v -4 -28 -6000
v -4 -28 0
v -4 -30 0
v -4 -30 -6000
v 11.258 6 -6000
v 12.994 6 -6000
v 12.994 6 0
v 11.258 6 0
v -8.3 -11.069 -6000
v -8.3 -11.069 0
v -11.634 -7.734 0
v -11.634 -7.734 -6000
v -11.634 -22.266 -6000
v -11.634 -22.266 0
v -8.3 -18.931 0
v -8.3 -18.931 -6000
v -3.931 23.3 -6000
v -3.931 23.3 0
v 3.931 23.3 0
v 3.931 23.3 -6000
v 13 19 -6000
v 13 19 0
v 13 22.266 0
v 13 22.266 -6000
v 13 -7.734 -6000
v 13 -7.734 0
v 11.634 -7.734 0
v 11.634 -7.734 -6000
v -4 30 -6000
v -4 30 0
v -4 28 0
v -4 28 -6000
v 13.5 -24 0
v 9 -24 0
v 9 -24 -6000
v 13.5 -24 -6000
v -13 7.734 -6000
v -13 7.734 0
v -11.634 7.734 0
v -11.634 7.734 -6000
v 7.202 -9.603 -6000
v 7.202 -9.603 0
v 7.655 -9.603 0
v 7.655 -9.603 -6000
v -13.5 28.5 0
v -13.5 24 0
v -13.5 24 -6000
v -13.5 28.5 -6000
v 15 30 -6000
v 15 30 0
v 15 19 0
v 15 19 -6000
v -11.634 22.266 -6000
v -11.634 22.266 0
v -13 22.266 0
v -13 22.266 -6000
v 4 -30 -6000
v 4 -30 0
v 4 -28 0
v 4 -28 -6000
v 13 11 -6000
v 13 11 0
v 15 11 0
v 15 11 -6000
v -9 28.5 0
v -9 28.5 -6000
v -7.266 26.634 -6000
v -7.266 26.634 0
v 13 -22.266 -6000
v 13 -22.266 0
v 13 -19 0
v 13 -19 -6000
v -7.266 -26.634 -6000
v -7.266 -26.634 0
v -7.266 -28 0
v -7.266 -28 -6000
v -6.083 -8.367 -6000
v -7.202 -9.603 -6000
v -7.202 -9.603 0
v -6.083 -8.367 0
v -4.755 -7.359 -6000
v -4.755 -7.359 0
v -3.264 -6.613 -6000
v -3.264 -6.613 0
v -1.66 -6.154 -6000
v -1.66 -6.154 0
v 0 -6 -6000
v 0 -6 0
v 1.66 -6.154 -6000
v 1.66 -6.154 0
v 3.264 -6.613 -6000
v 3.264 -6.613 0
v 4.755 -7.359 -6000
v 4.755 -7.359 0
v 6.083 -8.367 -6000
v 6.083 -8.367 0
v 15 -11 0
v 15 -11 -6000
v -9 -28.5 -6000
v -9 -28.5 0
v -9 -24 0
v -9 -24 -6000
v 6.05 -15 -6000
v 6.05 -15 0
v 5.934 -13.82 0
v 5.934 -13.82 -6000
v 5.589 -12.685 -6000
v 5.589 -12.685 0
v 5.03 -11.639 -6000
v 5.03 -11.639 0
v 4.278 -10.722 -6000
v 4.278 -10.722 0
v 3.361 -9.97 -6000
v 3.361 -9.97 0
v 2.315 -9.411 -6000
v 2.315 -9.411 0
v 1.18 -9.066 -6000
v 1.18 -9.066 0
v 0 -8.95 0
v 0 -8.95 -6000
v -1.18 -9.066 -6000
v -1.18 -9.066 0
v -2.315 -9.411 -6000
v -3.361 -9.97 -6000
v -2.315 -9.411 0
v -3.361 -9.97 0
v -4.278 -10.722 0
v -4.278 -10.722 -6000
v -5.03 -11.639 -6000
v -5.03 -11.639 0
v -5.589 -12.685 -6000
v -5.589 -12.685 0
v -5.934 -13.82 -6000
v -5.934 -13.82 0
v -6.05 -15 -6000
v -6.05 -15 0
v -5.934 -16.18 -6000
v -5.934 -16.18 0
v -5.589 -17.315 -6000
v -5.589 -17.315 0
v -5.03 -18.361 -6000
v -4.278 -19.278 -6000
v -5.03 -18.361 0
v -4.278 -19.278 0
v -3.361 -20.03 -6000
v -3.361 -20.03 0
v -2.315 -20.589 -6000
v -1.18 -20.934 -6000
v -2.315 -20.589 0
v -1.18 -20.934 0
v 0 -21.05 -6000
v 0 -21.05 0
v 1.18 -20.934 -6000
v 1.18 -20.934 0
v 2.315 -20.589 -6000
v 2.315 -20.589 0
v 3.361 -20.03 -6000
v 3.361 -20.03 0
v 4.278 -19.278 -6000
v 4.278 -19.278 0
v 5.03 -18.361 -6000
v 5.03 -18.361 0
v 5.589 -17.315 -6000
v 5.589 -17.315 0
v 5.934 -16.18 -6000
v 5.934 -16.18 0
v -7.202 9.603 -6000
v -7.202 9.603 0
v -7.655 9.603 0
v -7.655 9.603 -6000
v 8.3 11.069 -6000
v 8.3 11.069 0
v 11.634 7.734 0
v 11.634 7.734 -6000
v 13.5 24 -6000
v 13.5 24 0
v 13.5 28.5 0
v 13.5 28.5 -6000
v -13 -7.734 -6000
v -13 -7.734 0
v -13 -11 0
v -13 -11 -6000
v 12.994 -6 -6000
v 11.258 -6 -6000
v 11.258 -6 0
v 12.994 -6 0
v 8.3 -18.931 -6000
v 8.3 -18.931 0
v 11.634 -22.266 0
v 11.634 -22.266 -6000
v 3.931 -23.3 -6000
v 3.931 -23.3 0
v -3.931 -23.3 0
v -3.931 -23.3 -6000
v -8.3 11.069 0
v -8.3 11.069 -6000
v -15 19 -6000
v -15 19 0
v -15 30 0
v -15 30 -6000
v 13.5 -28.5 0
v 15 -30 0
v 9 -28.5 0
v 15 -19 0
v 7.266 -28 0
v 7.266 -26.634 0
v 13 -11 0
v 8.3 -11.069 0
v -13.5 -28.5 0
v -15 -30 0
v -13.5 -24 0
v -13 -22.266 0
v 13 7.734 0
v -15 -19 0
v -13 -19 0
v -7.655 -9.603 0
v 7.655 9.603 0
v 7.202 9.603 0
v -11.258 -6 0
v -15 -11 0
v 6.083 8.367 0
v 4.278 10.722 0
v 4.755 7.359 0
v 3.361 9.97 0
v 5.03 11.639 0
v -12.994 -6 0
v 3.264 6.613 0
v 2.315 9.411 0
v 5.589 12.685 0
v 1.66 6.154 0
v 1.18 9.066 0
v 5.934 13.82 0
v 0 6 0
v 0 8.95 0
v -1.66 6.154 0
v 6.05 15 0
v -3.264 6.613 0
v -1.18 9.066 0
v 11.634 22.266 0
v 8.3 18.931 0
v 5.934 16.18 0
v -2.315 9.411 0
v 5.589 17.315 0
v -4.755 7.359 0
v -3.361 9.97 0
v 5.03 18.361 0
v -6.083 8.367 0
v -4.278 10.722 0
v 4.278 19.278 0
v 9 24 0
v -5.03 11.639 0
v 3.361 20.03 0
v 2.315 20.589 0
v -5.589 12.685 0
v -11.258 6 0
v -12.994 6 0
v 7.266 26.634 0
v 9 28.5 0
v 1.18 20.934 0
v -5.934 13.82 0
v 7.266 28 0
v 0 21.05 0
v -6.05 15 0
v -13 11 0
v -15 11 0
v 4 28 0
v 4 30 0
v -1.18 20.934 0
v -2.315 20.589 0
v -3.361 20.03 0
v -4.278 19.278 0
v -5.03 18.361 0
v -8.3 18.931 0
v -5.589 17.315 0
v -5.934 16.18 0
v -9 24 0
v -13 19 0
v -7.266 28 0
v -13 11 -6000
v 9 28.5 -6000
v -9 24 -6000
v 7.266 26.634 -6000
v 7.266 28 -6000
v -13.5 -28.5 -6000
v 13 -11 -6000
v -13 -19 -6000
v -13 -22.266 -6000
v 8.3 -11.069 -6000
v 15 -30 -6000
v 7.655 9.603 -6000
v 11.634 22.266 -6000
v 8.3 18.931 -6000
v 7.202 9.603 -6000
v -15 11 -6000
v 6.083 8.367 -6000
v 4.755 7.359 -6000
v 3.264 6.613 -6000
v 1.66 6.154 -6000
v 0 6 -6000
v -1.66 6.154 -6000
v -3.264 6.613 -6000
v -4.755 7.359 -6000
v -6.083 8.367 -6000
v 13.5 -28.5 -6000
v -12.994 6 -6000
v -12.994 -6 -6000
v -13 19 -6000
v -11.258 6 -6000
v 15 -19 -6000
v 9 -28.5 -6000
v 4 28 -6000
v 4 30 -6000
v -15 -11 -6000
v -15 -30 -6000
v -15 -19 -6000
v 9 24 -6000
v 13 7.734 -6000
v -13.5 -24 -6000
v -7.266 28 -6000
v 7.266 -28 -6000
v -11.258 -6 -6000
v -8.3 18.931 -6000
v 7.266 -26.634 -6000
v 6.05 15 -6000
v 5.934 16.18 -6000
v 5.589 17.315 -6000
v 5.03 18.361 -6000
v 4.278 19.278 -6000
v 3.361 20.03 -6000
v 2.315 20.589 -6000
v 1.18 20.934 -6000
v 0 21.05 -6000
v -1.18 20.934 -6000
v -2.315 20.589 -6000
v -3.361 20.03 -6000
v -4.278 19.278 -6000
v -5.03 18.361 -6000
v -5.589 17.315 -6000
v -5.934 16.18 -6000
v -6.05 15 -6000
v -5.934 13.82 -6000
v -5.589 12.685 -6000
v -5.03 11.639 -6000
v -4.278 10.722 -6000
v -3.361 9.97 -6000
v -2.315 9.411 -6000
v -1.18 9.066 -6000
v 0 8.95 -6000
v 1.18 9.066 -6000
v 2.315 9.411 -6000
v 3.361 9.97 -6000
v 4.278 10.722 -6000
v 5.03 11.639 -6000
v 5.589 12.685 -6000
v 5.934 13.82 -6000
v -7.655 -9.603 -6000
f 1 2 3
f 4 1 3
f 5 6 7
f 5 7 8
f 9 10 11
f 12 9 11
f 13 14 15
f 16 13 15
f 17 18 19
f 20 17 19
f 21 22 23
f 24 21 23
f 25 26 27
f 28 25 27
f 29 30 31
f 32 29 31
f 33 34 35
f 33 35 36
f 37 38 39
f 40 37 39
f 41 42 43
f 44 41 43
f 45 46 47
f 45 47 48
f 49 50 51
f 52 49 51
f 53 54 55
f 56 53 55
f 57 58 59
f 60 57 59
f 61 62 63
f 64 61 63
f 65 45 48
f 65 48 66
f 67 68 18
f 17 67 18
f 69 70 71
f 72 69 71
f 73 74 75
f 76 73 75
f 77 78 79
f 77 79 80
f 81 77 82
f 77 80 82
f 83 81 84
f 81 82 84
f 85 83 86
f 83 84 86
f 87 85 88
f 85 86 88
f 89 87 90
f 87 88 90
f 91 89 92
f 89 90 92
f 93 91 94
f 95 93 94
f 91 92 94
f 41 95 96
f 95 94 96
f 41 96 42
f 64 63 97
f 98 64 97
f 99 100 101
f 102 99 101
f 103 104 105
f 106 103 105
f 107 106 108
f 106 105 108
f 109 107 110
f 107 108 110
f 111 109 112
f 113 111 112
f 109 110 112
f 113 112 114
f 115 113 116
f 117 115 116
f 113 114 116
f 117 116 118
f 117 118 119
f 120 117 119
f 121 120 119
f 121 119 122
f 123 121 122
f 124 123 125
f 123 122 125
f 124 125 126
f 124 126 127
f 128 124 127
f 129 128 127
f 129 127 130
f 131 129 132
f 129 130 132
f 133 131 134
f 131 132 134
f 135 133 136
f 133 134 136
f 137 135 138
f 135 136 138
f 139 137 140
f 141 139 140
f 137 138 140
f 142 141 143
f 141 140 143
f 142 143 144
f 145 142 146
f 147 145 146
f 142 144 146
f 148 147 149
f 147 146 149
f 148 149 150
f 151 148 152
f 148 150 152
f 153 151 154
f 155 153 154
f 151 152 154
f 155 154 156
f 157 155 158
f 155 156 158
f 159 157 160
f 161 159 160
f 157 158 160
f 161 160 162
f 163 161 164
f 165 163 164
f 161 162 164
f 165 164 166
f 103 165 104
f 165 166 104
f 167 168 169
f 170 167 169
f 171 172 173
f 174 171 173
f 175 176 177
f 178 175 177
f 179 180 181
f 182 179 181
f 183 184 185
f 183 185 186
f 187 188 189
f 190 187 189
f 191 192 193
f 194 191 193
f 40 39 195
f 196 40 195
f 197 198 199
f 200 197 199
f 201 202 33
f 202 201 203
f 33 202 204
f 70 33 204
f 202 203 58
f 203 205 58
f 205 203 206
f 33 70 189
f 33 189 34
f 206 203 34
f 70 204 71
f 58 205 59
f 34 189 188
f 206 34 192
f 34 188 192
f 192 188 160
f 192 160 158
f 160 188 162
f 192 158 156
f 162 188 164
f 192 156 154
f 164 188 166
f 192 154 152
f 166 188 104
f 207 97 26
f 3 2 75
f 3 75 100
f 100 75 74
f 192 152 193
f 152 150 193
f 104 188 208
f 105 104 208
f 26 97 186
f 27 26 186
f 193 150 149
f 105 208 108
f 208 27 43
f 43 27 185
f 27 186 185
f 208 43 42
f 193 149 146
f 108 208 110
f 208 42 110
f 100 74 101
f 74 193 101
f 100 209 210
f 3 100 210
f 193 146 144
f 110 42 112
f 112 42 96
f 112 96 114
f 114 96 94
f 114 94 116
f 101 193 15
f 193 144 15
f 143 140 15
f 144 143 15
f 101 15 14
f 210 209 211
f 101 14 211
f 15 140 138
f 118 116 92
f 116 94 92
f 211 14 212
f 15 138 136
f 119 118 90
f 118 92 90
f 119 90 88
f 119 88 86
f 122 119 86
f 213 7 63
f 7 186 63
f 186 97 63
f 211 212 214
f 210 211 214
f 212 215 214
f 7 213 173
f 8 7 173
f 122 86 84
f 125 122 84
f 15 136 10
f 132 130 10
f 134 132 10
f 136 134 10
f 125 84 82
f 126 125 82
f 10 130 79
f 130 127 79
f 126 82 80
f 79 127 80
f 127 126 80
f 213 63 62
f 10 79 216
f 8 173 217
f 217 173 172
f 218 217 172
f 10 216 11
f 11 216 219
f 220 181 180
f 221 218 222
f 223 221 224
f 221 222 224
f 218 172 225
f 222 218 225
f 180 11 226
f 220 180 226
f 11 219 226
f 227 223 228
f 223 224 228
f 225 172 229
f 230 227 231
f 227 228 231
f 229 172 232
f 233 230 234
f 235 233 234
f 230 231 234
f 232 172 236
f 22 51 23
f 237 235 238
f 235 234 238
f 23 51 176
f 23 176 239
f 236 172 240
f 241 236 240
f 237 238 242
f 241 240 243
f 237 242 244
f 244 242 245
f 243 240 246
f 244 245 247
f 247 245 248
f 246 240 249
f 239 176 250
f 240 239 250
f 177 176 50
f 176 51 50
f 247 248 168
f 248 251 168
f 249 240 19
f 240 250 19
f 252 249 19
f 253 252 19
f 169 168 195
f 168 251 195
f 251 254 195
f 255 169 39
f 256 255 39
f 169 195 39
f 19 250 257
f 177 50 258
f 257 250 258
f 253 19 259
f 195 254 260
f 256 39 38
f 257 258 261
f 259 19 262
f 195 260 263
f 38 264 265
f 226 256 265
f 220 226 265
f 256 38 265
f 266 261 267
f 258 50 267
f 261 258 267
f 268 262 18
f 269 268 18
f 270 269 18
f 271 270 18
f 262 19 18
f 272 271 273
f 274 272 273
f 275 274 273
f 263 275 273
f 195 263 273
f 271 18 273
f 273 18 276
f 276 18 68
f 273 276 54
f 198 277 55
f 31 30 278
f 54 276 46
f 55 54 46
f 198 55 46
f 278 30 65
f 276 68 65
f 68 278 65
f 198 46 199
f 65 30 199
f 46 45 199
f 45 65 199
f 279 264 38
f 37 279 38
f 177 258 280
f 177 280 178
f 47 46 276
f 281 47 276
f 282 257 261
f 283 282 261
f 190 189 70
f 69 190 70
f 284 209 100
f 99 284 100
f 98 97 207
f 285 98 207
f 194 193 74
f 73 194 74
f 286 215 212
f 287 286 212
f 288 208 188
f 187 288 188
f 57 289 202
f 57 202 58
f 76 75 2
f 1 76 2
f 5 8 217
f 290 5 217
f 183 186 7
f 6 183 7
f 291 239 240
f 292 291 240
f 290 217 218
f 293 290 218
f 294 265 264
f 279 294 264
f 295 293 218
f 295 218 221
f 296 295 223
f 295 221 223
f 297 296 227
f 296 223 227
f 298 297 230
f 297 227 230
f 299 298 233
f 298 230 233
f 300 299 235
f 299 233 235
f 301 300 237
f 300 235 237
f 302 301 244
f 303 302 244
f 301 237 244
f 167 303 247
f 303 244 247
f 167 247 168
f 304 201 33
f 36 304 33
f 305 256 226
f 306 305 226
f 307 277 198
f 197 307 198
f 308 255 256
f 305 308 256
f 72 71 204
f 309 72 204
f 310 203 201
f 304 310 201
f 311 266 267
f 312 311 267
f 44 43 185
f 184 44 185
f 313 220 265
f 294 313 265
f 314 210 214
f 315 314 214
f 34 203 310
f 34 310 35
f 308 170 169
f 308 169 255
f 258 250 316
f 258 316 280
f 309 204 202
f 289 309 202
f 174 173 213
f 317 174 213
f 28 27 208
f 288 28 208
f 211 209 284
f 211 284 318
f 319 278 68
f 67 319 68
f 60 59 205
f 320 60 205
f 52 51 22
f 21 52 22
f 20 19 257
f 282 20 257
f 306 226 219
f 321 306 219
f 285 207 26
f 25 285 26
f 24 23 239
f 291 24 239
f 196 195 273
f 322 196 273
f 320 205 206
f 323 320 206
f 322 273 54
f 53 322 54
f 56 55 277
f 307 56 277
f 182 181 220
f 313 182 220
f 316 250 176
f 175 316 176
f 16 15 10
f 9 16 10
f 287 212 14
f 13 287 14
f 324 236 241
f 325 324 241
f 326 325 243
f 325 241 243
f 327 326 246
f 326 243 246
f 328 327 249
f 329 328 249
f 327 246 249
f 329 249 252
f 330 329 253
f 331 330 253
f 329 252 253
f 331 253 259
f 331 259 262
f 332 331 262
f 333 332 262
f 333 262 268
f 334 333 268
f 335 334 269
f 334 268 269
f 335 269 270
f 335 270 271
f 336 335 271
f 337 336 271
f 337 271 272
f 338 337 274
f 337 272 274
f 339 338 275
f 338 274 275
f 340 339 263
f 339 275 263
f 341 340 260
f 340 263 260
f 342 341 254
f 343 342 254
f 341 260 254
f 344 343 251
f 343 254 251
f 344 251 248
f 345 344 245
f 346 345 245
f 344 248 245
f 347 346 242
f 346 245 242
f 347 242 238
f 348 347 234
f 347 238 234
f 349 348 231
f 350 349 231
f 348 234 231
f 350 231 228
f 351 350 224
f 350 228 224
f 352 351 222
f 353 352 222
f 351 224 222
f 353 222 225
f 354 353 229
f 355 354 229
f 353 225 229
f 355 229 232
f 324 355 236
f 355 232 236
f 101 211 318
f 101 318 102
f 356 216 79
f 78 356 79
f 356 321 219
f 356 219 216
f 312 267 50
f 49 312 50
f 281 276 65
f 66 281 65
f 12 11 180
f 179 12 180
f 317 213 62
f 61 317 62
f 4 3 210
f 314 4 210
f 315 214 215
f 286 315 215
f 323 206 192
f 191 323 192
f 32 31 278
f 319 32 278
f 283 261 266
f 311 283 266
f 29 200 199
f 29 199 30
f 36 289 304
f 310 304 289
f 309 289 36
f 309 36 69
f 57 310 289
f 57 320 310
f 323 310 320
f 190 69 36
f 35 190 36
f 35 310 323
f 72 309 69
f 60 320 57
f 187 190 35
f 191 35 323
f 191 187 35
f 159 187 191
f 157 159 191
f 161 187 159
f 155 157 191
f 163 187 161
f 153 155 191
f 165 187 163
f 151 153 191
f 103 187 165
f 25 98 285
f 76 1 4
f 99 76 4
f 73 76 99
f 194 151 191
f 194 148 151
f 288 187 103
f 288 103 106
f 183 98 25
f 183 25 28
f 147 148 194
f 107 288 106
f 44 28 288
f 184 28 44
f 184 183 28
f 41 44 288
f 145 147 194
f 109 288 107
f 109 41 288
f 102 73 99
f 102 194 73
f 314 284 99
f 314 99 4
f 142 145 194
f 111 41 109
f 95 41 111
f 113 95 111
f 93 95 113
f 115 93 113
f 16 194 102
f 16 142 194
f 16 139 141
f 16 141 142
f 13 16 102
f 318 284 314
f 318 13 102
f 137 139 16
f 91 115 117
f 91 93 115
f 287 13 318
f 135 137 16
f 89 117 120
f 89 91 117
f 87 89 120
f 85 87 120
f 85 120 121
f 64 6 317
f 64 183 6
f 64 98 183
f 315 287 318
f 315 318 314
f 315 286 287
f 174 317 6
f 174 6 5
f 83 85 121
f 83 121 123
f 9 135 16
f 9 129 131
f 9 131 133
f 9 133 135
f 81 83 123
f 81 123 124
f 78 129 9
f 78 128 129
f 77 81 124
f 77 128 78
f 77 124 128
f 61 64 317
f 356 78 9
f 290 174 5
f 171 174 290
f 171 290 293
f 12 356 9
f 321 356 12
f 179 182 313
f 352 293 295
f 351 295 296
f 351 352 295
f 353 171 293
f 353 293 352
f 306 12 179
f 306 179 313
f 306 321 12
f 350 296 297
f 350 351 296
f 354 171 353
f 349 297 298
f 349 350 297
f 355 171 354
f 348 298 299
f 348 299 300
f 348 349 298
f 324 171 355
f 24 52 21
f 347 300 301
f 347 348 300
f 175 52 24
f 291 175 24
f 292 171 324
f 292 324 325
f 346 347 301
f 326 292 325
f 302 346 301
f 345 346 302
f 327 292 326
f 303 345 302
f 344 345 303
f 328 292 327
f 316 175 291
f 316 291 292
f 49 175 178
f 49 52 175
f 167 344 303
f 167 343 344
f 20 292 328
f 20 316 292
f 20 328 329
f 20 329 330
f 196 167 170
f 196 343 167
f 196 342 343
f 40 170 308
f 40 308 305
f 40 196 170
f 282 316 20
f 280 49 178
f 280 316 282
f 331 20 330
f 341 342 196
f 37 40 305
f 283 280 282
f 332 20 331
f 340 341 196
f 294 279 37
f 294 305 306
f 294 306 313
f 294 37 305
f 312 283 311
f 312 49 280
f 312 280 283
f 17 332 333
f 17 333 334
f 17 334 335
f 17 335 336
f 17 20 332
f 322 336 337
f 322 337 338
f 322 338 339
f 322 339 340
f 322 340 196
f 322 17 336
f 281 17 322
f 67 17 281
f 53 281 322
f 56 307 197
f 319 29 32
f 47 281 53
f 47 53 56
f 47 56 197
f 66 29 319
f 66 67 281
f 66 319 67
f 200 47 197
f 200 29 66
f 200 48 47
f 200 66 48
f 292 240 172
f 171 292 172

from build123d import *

# Parameters (mm, degrees)
SKETCH_B01_6_R   = 6.049999362
SKETCH_B01_6_R_2 = 6.050001038
SKETCH_B01_6_W   = 4.5
SKETCH_B01_6_H   = 4.5
EXTRUDE1_DEPTH   = 6000


with BuildPart() as part:
    # Sketch B01-6 → Extrude1 (new body)
    with BuildSketch(Plane.XY):
        Polygon((-13, -22.265685), (-11.634315, -22.265685), (-8.3, -18.931371213), (-8.3, -11.068628787), (-11.634315, -7.734315), (-13, -7.734315), (-13, -11), (-15, -11), (-15, 11), (-13, 11), (-13, 7.734315), (-11.634315, 7.734315), (-8.3, 11.068628787), (-8.3, 18.931371213), (-11.634315, 22.265685), (-13, 22.265685), (-13, 19), (-15, 19), (-15, 30), (-4, 30), (-4, 28), (-7.265685, 28), (-7.265685, 26.634315), (-3.931371213, 23.3), (3.931371213, 23.3), (7.265685, 26.634315), (7.265685, 28), (4, 28), (4, 30), (15, 30), (15, 19), (13, 19), (13, 22.265685), (11.634315, 22.265685), (8.3, 18.931371213), (8.3, 11.068628787), (11.634315, 7.734315), (13, 7.734315), (13, 11), (15, 11), (15, -11), (13, -11), (13, -7.734315), (11.634315, -7.734315), (8.3, -11.068628787), (8.3, -18.931371213), (11.634315, -22.265685), (13, -22.265685), (13, -19), (15, -19), (15, -30), (4, -30), (4, -28), (7.265685, -28), (7.265685, -26.634315), (3.931371213, -23.3), (-3.931371213, -23.3), (-7.265685, -26.634315), (-7.265685, -28), (-4, -28), (-4, -30), (-15, -30), (-15, -19), (-13, -19), align=None)
        with Locations((-2.09e-07, -14.999997135)):
            Circle(SKETCH_B01_6_R, mode=Mode.SUBTRACT)
        with Locations((-2.09e-07, 14.999997135)):
            Circle(SKETCH_B01_6_R_2, mode=Mode.SUBTRACT)
        with BuildLine():
            Line((-7.655281293, -9.603124178), (-7.202246191, -9.602996335))
            ThreePointArc((-7.202246191, -9.602996335), (-2.09e-07, -5.999999089), (7.202245773, -9.602996335))
            Line((7.202245773, -9.602996335), (7.655280874, -9.603124178))
            Line((7.655280874, -9.603124178), (11.258403758, -6))
            Line((11.258403758, -6), (12.994452, -6))
            Line((12.994452, -6), (12.994452, 6))
            Line((12.994452, 6), (11.258403758, 6))
            Line((11.258403758, 6), (7.655280874, 9.603124178))
            Line((7.655280874, 9.603124178), (7.202245773, 9.602996335))
            ThreePointArc((7.202245773, 9.602996335), (-2.09e-07, 5.999999089), (-7.202246191, 9.602996335))
            Line((-7.202246191, 9.602996335), (-7.655281293, 9.603124178))
            Line((-7.655281293, 9.603124178), (-11.258404176, 6))
            Line((-11.258404176, 6), (-12.994452419, 6))
            Line((-12.994452419, 6), (-12.994452419, -6))
            Line((-12.994452419, -6), (-11.258404176, -6))
            Line((-11.258404176, -6), (-7.655281293, -9.603124178))
        make_face(mode=Mode.SUBTRACT)
        with Locations((-11.25, -26.25)):
            Rectangle(SKETCH_B01_6_W, SKETCH_B01_6_H, mode=Mode.SUBTRACT)
        with Locations((-11.25, 26.25)):
            Rectangle(SKETCH_B01_6_W, SKETCH_B01_6_H, mode=Mode.SUBTRACT)
        with Locations((11.25, -26.25)):
            Rectangle(SKETCH_B01_6_W, SKETCH_B01_6_H, mode=Mode.SUBTRACT)
        with Locations((11.25, 26.25)):
            Rectangle(SKETCH_B01_6_W, SKETCH_B01_6_H, mode=Mode.SUBTRACT)
    extrude(amount=-EXTRUDE1_DEPTH)


solid = part.part
